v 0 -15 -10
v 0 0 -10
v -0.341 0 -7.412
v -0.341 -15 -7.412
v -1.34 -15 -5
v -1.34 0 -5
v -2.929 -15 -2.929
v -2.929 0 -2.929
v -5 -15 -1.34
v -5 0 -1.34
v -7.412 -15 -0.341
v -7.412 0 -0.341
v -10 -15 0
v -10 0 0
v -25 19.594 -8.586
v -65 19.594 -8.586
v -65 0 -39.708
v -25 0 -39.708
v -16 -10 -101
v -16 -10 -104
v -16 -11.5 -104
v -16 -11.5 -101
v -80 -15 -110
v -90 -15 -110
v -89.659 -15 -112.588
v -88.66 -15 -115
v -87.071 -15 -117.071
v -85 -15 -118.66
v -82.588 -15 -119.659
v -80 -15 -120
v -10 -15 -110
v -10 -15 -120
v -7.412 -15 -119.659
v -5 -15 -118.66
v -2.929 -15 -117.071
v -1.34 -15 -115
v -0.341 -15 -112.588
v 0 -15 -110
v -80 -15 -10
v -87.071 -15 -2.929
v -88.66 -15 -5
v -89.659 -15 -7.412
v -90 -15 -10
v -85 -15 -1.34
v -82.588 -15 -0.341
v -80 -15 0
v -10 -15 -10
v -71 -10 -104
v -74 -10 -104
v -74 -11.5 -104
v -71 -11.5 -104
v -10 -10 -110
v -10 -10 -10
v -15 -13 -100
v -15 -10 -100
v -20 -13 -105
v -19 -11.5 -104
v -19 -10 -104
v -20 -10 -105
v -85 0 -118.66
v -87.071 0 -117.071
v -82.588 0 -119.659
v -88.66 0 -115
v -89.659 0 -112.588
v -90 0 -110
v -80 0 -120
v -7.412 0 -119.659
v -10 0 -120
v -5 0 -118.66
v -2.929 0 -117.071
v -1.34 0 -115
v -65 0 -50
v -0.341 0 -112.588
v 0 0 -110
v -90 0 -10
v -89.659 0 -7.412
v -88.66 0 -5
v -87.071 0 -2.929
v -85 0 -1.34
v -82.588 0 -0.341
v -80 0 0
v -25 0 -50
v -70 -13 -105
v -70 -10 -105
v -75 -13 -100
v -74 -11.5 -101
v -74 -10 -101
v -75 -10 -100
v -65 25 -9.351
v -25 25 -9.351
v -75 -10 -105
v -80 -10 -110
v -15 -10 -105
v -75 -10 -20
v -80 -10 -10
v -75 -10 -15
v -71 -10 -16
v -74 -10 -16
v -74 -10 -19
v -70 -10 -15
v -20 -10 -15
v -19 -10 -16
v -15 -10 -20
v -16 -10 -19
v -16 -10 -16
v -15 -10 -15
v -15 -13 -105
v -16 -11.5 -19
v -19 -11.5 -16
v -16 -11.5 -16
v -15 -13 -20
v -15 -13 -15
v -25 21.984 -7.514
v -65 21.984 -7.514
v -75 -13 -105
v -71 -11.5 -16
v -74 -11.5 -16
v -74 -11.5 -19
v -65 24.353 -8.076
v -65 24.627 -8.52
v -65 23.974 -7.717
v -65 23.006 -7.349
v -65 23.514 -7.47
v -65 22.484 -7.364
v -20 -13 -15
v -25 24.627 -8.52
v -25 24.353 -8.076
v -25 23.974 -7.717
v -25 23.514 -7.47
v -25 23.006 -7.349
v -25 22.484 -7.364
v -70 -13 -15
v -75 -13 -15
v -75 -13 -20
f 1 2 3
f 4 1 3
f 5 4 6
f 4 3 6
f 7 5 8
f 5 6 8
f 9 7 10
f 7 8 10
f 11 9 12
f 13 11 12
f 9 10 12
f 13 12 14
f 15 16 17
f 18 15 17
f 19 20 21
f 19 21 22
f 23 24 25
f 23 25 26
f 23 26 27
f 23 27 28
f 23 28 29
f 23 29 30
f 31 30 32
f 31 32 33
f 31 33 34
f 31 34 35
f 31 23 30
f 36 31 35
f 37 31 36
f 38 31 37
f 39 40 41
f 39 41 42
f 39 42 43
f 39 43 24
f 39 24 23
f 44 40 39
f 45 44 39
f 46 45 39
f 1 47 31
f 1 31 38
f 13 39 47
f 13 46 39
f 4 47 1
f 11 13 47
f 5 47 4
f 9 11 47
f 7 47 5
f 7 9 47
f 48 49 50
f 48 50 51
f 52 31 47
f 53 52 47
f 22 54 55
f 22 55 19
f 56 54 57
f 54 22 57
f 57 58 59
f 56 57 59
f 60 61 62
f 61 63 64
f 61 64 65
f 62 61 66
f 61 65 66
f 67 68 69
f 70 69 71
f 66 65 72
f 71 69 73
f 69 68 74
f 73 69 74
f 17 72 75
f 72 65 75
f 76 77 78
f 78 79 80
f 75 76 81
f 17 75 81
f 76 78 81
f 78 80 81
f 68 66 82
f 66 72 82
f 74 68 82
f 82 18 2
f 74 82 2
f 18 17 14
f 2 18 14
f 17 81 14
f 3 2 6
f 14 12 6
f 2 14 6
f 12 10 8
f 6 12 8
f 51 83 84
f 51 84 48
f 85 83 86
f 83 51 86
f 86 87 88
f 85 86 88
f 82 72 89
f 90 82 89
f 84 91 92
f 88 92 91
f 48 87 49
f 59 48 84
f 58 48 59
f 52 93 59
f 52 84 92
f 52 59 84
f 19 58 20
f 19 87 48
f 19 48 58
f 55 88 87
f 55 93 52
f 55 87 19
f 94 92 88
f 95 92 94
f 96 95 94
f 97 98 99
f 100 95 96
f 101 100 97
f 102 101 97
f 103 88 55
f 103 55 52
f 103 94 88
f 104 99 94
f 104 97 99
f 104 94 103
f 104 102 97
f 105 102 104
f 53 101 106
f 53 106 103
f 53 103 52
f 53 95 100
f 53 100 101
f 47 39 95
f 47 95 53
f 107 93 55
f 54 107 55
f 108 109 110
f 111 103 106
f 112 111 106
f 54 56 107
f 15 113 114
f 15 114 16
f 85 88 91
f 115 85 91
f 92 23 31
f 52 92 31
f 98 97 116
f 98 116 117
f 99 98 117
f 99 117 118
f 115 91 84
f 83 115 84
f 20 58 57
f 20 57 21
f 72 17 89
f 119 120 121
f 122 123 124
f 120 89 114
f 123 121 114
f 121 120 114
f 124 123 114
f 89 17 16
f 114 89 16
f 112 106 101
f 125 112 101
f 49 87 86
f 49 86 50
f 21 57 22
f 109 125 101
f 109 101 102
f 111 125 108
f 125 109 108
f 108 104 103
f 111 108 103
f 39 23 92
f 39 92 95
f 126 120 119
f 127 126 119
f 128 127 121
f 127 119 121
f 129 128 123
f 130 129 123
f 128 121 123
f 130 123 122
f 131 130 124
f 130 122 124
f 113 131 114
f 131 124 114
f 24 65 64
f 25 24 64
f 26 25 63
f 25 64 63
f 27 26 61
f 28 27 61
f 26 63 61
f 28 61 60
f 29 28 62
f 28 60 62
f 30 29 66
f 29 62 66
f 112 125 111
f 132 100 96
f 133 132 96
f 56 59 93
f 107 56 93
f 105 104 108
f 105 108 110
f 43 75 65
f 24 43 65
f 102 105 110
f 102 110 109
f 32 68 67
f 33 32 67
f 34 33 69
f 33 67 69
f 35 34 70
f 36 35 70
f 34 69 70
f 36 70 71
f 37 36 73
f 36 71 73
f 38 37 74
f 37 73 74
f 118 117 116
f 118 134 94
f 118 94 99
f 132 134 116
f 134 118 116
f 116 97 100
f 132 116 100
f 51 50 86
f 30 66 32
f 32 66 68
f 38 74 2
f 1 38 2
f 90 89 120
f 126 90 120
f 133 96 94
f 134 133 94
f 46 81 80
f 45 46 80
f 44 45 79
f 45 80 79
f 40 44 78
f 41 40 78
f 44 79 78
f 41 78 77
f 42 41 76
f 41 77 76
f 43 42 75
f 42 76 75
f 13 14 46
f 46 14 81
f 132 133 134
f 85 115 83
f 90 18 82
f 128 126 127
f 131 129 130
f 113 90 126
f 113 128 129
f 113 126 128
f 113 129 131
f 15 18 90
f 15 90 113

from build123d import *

# Parameters (mm, degrees)
F1_DEPTH  = 15
F2_W      = 70
F2_H      = 100
F3_DEPTH  = 5
F4_W      = 40
F4_H      = 50
F5_DEPTH  = 25
F7_DEPTH  = 40
F9_DEPTH  = 40
F11_DEPTH = 3
F13_DEPTH = 1.5
F14_DEPTH = 1.5


with BuildPart() as f1:
    # F0 (on Front) → F1 (new body)
    with BuildSketch(Plane.XZ):
        with BuildLine():
            ThreePointArc((-80, 0), (-87.071068, -2.928932), (-90, -10))
            Line((-90, -10), (-90, -110))
            ThreePointArc((-90, -110), (-87.071068, -117.071068), (-80, -120))
            Line((-80, -120), (-10, -120))
            ThreePointArc((-10, -120), (-2.928932, -117.071068), (0, -110))
            Line((0, -110), (0, -10))
            ThreePointArc((0, -10), (-2.928932, -2.928932), (-10, 0))
            Line((-10, 0), (-80, 0))
        make_face()
    extrude(amount=F1_DEPTH)

    # F2 (on face) → F3 (cut)
    with BuildSketch(Plane.XZ.offset(15)):
        with Locations((-45, -60)):
            Rectangle(F2_W, F2_H)
    extrude(amount=-F3_DEPTH, mode=Mode.SUBTRACT)

    # F4 (on face) → F5 (join)
    with BuildSketch(Plane(origin=(0, 0, 0), x_dir=(-1, 0, 0), z_dir=(0, 1, 0))):
        with Locations((45, -25)):
            Rectangle(F4_W, F4_H)
    extrude(amount=F5_DEPTH)

    # F6 (on face) → F7 (cut)
    with BuildSketch(Plane(origin=(-65, 0, 0), x_dir=(0, -1, 0), z_dir=(-1, 0, 0))):
        Polygon((0, -39.708052), (0, 0), (-25, 0), align=None)
        Polygon((-25, -9.351011), (-25, -50), (0, -50), align=None)
    extrude(amount=-F7_DEPTH, mode=Mode.SUBTRACT)

    # F8 (on face) → F9 (cut)
    with BuildSketch(Plane(origin=(-65, 0, 0), x_dir=(0, -1, 0), z_dir=(-1, 0, 0))):
        with BuildLine():
            Line((-19.594347, -8.585918), (-25, 0))
            Line((-25, 0), (-25, -9.351011))
            Line((-25, -9.351011), (-24.627329, -8.520231))
            ThreePointArc((-24.627329, -8.520231), (-23.514035, -7.469649), (-21.983944, -7.513993))
            Line((-21.983944, -7.513993), (-19.594347, -8.585918))
        make_face()
    extrude(amount=-F9_DEPTH, mode=Mode.SUBTRACT)

    # F10 (on face) → F11 (join)
    with BuildSketch(Plane.XZ.offset(10)):
        Polygon((-20, -15), (-15, -20), (-15, -15), align=None)
        Polygon((-70, -105), (-75, -100), (-75, -105), align=None)
        Polygon((-75, -20), (-70, -15), (-75, -15), align=None)
        Polygon((-15, -100), (-20, -105), (-15, -105), align=None)
    extrude(amount=F11_DEPTH)

    # F12 (on face) → F13 (cut)
    with BuildSketch(Plane.XZ.offset(10)):
        Polygon((-74, -19), (-71, -16), (-74, -16), align=None)
        Polygon((-19, -16), (-16, -19), (-16, -16), align=None)
        Polygon((-71, -104), (-74, -101), (-74, -104), align=None)
        Polygon((-16, -101), (-19, -104), (-16, -104), align=None)
    extrude(amount=F13_DEPTH, mode=Mode.SUBTRACT)

    # F12 (on face) → F14 (cut)
    with BuildSketch(Plane.XZ.offset(10)):
        Polygon((-74, -19), (-71, -16), (-74, -16), align=None)
        Polygon((-19, -16), (-16, -19), (-16, -16), align=None)
        Polygon((-71, -104), (-74, -101), (-74, -104), align=None)
        Polygon((-16, -101), (-19, -104), (-16, -104), align=None)
    extrude(amount=F14_DEPTH, mode=Mode.SUBTRACT)


solid = f1.part
